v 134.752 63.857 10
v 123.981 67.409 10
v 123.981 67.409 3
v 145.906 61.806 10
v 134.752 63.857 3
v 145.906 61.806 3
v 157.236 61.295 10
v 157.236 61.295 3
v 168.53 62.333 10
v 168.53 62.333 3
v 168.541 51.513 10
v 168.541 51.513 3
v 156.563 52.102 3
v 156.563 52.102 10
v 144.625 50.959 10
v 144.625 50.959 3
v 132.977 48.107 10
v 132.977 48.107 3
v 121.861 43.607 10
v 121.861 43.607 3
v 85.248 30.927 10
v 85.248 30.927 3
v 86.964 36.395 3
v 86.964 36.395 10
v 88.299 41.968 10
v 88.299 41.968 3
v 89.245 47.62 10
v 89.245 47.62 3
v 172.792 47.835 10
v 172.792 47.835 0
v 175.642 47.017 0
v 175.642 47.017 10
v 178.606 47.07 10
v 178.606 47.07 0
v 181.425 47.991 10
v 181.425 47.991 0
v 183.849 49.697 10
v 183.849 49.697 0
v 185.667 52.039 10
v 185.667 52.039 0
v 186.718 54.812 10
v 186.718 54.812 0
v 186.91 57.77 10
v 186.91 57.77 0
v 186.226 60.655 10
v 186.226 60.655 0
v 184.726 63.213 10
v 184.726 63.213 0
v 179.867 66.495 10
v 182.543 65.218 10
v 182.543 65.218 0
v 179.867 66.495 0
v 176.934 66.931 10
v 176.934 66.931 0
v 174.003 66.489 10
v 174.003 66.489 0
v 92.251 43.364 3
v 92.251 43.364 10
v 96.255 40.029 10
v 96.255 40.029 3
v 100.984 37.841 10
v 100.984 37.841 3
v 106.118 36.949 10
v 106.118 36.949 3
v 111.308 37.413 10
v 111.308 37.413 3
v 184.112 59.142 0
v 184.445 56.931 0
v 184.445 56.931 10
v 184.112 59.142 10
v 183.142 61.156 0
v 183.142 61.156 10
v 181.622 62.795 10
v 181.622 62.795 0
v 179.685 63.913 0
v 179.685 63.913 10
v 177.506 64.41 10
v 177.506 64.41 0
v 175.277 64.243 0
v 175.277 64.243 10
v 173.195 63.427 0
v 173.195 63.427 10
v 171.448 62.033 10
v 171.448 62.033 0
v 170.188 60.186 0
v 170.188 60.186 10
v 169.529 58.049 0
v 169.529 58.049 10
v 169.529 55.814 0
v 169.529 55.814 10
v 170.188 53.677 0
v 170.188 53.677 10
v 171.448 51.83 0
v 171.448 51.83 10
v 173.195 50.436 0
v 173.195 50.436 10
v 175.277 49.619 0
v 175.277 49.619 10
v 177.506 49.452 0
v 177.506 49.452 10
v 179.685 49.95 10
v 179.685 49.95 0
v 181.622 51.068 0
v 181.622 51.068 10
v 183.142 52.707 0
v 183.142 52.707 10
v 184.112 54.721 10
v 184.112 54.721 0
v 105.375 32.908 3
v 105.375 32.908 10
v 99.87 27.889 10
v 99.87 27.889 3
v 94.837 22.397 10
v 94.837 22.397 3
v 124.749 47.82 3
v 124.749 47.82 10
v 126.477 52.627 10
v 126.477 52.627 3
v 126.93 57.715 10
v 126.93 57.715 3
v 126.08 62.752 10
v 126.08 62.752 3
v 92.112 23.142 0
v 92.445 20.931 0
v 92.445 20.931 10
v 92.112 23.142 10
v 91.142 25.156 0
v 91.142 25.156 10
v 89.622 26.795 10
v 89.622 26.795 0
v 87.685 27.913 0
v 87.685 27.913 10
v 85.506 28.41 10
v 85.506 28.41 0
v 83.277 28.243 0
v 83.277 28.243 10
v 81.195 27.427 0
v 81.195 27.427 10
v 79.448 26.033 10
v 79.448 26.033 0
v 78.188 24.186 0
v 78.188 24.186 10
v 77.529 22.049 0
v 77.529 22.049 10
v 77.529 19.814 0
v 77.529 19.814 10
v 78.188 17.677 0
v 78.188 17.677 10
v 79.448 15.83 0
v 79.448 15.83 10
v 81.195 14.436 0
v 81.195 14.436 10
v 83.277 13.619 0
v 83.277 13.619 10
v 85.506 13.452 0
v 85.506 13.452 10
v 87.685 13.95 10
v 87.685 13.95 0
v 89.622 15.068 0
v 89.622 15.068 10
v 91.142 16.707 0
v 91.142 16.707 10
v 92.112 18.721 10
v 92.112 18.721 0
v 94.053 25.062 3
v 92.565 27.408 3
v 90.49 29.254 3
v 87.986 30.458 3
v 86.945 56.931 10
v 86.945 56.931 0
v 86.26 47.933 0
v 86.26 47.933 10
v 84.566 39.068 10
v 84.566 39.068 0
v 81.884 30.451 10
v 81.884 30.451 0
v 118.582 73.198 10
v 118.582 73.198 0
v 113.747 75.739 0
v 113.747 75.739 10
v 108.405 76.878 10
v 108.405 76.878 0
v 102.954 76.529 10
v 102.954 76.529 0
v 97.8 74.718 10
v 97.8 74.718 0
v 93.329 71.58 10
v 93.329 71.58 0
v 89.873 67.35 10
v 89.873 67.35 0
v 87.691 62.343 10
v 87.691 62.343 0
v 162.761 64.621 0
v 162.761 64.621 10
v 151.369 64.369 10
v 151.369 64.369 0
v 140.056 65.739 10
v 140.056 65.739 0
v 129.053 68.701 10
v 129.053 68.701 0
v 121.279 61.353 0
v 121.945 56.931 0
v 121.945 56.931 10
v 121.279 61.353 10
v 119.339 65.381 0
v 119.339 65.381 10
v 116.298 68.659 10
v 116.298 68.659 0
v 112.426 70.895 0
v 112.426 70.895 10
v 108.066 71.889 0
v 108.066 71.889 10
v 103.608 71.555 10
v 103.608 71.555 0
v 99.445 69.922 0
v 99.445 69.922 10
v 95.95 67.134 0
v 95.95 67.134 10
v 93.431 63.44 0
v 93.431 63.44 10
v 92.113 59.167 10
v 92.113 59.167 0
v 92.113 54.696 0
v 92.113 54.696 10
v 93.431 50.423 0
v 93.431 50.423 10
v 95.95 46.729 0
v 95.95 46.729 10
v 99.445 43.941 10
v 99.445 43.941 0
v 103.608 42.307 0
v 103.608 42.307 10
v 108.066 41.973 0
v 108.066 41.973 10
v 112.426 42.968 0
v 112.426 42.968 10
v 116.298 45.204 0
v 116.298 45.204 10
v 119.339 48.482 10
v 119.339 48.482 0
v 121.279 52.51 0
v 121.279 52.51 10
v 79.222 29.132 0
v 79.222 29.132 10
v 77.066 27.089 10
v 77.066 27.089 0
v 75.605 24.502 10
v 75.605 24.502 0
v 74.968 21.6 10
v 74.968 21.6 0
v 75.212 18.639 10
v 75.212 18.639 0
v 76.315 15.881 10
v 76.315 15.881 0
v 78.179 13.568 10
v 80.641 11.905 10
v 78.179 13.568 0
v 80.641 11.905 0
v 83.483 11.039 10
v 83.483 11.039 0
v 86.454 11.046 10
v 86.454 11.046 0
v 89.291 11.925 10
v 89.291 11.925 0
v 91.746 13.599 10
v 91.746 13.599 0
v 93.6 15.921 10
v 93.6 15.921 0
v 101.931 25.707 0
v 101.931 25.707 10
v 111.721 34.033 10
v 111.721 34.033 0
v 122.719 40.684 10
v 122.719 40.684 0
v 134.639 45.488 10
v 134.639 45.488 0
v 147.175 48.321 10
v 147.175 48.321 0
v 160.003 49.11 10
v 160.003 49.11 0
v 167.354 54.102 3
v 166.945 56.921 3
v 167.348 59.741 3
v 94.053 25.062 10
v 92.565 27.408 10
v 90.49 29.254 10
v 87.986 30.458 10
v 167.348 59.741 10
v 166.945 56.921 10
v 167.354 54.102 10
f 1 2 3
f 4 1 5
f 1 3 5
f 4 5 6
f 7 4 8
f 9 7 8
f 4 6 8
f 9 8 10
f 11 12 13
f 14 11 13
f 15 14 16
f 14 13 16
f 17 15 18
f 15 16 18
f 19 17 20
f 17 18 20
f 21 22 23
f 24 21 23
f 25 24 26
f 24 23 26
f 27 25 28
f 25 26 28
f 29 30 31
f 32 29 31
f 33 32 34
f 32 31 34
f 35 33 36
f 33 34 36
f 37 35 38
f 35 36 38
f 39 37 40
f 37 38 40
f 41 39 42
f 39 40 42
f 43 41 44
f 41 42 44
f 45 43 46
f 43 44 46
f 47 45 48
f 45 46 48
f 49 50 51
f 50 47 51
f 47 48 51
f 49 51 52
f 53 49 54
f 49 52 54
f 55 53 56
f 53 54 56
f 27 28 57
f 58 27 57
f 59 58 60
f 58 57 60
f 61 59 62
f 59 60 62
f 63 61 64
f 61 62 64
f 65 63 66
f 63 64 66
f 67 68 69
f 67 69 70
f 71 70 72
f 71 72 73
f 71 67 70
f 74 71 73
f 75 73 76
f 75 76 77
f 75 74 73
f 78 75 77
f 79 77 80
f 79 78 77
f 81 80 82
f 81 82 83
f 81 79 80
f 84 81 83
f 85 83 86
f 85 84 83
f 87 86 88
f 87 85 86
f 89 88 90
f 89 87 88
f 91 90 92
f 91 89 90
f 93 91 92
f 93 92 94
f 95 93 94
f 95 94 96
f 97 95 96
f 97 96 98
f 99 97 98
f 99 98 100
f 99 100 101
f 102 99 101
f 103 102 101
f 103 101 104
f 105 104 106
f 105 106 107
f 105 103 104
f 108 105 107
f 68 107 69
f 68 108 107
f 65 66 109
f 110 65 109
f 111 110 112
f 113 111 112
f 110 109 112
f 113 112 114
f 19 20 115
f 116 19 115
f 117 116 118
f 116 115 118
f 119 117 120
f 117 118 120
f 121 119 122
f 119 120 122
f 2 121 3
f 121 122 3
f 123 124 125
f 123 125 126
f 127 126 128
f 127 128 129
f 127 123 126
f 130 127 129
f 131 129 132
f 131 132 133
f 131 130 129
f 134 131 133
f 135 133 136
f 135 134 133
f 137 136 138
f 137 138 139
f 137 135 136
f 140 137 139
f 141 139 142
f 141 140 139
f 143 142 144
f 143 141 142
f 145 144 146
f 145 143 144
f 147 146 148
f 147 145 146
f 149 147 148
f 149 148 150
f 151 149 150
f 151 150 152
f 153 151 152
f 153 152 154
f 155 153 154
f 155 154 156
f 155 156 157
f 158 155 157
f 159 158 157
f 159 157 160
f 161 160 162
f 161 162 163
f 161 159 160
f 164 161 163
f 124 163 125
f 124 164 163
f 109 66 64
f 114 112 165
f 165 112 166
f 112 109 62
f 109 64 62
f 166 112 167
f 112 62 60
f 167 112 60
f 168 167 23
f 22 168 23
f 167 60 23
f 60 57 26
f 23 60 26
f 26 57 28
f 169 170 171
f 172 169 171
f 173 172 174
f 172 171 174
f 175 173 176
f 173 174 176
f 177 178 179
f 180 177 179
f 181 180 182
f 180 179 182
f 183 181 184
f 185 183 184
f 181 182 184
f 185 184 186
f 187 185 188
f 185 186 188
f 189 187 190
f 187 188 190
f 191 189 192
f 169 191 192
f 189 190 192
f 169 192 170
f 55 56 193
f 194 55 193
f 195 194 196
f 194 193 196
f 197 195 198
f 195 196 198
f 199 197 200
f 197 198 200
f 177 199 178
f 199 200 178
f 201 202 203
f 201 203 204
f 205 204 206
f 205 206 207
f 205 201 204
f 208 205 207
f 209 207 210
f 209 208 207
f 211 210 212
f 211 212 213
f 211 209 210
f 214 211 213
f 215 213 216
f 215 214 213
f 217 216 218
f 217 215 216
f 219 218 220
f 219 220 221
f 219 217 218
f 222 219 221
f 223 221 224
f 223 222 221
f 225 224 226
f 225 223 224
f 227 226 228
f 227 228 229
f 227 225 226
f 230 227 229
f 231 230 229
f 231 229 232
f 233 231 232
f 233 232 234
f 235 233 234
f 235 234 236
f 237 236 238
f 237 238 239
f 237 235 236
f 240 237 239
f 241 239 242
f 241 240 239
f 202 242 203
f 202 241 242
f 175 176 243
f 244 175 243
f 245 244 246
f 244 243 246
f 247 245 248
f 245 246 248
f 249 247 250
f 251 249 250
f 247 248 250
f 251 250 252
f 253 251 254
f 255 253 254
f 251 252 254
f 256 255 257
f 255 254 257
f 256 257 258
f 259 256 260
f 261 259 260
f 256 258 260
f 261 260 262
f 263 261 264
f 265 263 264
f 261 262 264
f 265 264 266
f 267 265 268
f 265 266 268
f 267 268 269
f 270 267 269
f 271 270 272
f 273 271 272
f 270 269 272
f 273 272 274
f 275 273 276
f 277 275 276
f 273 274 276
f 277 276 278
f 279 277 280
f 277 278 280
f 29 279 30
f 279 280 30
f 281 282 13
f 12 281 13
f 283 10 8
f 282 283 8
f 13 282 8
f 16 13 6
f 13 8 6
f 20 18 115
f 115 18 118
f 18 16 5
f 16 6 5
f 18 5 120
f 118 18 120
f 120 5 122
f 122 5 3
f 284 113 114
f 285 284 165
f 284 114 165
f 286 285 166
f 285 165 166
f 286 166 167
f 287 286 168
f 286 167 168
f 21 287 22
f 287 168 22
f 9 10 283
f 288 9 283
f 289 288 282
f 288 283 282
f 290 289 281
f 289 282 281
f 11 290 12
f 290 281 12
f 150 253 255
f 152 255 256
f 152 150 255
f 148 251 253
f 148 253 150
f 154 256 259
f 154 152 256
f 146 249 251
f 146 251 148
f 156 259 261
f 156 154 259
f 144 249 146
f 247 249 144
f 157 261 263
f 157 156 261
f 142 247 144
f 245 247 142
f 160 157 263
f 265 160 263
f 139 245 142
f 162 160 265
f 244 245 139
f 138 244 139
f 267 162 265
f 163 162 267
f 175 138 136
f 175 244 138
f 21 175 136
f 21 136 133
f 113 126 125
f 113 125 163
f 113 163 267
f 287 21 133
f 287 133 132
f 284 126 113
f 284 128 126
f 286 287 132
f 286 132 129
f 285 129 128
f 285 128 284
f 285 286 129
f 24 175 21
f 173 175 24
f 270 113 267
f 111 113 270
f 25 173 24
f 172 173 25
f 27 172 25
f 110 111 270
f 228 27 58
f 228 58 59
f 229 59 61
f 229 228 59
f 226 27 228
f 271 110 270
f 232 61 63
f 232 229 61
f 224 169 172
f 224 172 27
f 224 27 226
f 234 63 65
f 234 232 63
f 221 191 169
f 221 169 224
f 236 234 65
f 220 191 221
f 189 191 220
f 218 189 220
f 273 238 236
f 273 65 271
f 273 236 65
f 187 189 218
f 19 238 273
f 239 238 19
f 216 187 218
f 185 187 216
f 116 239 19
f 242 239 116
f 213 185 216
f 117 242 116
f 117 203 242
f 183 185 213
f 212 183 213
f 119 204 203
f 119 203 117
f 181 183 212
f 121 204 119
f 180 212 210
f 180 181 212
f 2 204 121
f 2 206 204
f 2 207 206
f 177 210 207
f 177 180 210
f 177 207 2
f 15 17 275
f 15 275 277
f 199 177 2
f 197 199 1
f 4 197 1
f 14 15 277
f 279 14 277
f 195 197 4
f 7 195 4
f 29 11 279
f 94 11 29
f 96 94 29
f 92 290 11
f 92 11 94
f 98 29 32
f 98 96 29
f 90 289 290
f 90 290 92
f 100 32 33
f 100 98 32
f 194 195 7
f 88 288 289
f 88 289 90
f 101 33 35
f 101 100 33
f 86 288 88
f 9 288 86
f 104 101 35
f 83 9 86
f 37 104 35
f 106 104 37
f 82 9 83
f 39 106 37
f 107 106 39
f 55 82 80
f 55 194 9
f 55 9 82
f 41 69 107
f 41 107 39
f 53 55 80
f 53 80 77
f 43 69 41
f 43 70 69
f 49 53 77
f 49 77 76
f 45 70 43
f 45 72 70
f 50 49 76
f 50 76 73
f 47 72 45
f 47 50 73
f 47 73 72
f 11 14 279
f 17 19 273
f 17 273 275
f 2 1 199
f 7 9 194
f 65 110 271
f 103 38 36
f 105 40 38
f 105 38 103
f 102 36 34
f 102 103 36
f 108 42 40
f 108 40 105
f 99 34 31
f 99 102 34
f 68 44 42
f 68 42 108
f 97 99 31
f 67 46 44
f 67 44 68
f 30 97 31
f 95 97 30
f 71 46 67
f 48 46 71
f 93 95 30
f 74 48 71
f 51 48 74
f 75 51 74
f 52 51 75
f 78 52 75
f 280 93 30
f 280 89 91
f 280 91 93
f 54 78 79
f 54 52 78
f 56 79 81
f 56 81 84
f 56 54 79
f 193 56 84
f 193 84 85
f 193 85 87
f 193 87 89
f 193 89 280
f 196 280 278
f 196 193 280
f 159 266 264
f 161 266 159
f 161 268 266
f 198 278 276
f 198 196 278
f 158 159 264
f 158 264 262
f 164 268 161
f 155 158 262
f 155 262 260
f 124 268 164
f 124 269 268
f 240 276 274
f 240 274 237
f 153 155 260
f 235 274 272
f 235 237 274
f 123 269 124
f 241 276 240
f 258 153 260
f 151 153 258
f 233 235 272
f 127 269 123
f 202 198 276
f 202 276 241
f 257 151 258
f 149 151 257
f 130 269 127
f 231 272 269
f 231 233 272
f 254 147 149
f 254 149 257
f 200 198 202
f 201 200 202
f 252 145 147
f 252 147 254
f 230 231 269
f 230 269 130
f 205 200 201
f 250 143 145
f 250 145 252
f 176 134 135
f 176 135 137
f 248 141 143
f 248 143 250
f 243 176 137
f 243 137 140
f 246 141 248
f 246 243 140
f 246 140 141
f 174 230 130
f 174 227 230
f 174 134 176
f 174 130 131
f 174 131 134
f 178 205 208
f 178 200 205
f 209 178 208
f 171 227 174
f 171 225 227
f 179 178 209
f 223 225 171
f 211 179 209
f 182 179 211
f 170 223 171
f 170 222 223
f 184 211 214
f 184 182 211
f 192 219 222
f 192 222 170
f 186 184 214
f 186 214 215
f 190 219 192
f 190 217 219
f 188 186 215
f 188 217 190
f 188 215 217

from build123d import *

# Parameters (mm, degrees)
SKETCH3_R           = 20
SKETCH3_R_2         = 15
SKETCH3_R_3         = 10
SKETCH3_R_4         = 7.5
BOSS_EXTRUDE1_DEPTH = 10
BOSS_EXTRUDE3_DEPTH = 3


with BuildPart() as part:
    # Sketch3 → Boss-Extrude1 (new body)
    # profile 1 of 6: a face of its own
    with BuildSketch(Plane.XY):
        with BuildLine():
            ThreePointArc((93.599540264, 15.920778558), (128.582431805, 43.32581827), (172.792265807, 47.834640706))
            ThreePointArc((172.792265807, 47.834640706), (170.402615718, 49.368900415), (168.540603284, 51.513029633))
            ThreePointArc((168.540603284, 51.513029633), (144.624934442, 50.959037098), (121.8606014, 43.607080548))
            ThreePointArc((121.8606014, 43.607080548), (117.069520627, 39.683138814), (111.307748037, 37.412951524))
            ThreePointArc((111.307748037, 37.412951524), (102.56627164, 30.460503982), (94.837400467, 22.39734785))
            ThreePointArc((94.837400467, 22.39734785), (94.918388119, 21.666366387), (94.945432764, 20.931409595))
            ThreePointArc((94.945432764, 20.931409595), (94.603100055, 18.337288838), (93.599540264, 15.920778558))
        make_face()
    # profile 2 of 6: a face of its own
    with BuildSketch(Plane.XY):
        with BuildLine():
            ThreePointArc((89.245155024, 47.620117101), (87.528873404, 52.135867645), (86.945432764, 56.931409595))
            ThreePointArc((86.945432764, 56.931409595), (85.538303333, 43.476636452), (81.884211959, 30.451332241))
            ThreePointArc((81.884211959, 30.451332241), (83.546001392, 30.833005014), (85.248475349, 30.9268168))
            ThreePointArc((85.248475349, 30.9268168), (87.679513668, 39.169871065), (89.245155024, 47.620117101))
        make_face()
    # profile 3 of 6: a face of its own
    with BuildSketch(Plane.XY):
        with BuildLine():
            ThreePointArc((168.529854034, 62.33307921), (170.898087492, 64.895680758), (174.002612838, 66.488595942))
            ThreePointArc((174.002612838, 66.488595942), (145.688050003, 64.85214344), (118.581891775, 73.197719001))
            ThreePointArc((118.581891775, 73.197719001), (121.570888747, 70.573111736), (123.981351449, 67.408884223))
            ThreePointArc((123.981351449, 67.408884223), (145.906367795, 61.805873057), (168.529854034, 62.33307921))
        make_face()
    # profile 4 of 6: a face of its own
    with BuildSketch(Plane.XY):
        with Locations((106.945432764, 56.931409595)):
            Circle(SKETCH3_R)
        with Locations((106.945432764, 56.931409595)):
            Circle(SKETCH3_R_2, mode=Mode.SUBTRACT)
    # profile 5 of 6: a face of its own
    with BuildSketch(Plane.XY):
        with Locations((84.945432764, 20.931409595)):
            Circle(SKETCH3_R_3)
        with Locations((84.945432764, 20.931409595)):
            Circle(SKETCH3_R_4, mode=Mode.SUBTRACT)
    # profile 6 of 6: a face of its own
    with BuildSketch(Plane.XY):
        with Locations((176.945432764, 56.931409595)):
            Circle(SKETCH3_R_3)
        with Locations((176.945432764, 56.931409595)):
            Circle(SKETCH3_R_4, mode=Mode.SUBTRACT)
    extrude(amount=BOSS_EXTRUDE1_DEPTH)

    # Sketch4 → Boss-Extrude3 (add)
    with BuildSketch(Plane.XY):
        with BuildLine():
            ThreePointArc((94.837400467, 22.39734785), (91.59167372, 28.403188577), (85.248475349, 30.9268168))
            ThreePointArc((85.248475349, 30.9268168), (87.679513668, 39.169871065), (89.245155024, 47.620117101))
            ThreePointArc((89.245155024, 47.620117101), (98.547702834, 38.779877097), (111.307748037, 37.412951524))
            ThreePointArc((111.307748037, 37.412951524), (102.56627164, 30.460503982), (94.837400467, 22.39734785))
        make_face()
        with BuildLine():
            ThreePointArc((168.529854034, 62.33307921), (166.945437699, 56.921475033), (168.540603284, 51.513029633))
            ThreePointArc((168.540603284, 51.513029633), (144.624934442, 50.959037098), (121.8606014, 43.607080548))
            ThreePointArc((121.8606014, 43.607080548), (126.866513553, 55.156433479), (123.981351449, 67.408884223))
            ThreePointArc((123.981351449, 67.408884223), (145.906367795, 61.805873057), (168.529854034, 62.33307921))
        make_face()
    extrude(amount=BOSS_EXTRUDE3_DEPTH)


solid = part.part
